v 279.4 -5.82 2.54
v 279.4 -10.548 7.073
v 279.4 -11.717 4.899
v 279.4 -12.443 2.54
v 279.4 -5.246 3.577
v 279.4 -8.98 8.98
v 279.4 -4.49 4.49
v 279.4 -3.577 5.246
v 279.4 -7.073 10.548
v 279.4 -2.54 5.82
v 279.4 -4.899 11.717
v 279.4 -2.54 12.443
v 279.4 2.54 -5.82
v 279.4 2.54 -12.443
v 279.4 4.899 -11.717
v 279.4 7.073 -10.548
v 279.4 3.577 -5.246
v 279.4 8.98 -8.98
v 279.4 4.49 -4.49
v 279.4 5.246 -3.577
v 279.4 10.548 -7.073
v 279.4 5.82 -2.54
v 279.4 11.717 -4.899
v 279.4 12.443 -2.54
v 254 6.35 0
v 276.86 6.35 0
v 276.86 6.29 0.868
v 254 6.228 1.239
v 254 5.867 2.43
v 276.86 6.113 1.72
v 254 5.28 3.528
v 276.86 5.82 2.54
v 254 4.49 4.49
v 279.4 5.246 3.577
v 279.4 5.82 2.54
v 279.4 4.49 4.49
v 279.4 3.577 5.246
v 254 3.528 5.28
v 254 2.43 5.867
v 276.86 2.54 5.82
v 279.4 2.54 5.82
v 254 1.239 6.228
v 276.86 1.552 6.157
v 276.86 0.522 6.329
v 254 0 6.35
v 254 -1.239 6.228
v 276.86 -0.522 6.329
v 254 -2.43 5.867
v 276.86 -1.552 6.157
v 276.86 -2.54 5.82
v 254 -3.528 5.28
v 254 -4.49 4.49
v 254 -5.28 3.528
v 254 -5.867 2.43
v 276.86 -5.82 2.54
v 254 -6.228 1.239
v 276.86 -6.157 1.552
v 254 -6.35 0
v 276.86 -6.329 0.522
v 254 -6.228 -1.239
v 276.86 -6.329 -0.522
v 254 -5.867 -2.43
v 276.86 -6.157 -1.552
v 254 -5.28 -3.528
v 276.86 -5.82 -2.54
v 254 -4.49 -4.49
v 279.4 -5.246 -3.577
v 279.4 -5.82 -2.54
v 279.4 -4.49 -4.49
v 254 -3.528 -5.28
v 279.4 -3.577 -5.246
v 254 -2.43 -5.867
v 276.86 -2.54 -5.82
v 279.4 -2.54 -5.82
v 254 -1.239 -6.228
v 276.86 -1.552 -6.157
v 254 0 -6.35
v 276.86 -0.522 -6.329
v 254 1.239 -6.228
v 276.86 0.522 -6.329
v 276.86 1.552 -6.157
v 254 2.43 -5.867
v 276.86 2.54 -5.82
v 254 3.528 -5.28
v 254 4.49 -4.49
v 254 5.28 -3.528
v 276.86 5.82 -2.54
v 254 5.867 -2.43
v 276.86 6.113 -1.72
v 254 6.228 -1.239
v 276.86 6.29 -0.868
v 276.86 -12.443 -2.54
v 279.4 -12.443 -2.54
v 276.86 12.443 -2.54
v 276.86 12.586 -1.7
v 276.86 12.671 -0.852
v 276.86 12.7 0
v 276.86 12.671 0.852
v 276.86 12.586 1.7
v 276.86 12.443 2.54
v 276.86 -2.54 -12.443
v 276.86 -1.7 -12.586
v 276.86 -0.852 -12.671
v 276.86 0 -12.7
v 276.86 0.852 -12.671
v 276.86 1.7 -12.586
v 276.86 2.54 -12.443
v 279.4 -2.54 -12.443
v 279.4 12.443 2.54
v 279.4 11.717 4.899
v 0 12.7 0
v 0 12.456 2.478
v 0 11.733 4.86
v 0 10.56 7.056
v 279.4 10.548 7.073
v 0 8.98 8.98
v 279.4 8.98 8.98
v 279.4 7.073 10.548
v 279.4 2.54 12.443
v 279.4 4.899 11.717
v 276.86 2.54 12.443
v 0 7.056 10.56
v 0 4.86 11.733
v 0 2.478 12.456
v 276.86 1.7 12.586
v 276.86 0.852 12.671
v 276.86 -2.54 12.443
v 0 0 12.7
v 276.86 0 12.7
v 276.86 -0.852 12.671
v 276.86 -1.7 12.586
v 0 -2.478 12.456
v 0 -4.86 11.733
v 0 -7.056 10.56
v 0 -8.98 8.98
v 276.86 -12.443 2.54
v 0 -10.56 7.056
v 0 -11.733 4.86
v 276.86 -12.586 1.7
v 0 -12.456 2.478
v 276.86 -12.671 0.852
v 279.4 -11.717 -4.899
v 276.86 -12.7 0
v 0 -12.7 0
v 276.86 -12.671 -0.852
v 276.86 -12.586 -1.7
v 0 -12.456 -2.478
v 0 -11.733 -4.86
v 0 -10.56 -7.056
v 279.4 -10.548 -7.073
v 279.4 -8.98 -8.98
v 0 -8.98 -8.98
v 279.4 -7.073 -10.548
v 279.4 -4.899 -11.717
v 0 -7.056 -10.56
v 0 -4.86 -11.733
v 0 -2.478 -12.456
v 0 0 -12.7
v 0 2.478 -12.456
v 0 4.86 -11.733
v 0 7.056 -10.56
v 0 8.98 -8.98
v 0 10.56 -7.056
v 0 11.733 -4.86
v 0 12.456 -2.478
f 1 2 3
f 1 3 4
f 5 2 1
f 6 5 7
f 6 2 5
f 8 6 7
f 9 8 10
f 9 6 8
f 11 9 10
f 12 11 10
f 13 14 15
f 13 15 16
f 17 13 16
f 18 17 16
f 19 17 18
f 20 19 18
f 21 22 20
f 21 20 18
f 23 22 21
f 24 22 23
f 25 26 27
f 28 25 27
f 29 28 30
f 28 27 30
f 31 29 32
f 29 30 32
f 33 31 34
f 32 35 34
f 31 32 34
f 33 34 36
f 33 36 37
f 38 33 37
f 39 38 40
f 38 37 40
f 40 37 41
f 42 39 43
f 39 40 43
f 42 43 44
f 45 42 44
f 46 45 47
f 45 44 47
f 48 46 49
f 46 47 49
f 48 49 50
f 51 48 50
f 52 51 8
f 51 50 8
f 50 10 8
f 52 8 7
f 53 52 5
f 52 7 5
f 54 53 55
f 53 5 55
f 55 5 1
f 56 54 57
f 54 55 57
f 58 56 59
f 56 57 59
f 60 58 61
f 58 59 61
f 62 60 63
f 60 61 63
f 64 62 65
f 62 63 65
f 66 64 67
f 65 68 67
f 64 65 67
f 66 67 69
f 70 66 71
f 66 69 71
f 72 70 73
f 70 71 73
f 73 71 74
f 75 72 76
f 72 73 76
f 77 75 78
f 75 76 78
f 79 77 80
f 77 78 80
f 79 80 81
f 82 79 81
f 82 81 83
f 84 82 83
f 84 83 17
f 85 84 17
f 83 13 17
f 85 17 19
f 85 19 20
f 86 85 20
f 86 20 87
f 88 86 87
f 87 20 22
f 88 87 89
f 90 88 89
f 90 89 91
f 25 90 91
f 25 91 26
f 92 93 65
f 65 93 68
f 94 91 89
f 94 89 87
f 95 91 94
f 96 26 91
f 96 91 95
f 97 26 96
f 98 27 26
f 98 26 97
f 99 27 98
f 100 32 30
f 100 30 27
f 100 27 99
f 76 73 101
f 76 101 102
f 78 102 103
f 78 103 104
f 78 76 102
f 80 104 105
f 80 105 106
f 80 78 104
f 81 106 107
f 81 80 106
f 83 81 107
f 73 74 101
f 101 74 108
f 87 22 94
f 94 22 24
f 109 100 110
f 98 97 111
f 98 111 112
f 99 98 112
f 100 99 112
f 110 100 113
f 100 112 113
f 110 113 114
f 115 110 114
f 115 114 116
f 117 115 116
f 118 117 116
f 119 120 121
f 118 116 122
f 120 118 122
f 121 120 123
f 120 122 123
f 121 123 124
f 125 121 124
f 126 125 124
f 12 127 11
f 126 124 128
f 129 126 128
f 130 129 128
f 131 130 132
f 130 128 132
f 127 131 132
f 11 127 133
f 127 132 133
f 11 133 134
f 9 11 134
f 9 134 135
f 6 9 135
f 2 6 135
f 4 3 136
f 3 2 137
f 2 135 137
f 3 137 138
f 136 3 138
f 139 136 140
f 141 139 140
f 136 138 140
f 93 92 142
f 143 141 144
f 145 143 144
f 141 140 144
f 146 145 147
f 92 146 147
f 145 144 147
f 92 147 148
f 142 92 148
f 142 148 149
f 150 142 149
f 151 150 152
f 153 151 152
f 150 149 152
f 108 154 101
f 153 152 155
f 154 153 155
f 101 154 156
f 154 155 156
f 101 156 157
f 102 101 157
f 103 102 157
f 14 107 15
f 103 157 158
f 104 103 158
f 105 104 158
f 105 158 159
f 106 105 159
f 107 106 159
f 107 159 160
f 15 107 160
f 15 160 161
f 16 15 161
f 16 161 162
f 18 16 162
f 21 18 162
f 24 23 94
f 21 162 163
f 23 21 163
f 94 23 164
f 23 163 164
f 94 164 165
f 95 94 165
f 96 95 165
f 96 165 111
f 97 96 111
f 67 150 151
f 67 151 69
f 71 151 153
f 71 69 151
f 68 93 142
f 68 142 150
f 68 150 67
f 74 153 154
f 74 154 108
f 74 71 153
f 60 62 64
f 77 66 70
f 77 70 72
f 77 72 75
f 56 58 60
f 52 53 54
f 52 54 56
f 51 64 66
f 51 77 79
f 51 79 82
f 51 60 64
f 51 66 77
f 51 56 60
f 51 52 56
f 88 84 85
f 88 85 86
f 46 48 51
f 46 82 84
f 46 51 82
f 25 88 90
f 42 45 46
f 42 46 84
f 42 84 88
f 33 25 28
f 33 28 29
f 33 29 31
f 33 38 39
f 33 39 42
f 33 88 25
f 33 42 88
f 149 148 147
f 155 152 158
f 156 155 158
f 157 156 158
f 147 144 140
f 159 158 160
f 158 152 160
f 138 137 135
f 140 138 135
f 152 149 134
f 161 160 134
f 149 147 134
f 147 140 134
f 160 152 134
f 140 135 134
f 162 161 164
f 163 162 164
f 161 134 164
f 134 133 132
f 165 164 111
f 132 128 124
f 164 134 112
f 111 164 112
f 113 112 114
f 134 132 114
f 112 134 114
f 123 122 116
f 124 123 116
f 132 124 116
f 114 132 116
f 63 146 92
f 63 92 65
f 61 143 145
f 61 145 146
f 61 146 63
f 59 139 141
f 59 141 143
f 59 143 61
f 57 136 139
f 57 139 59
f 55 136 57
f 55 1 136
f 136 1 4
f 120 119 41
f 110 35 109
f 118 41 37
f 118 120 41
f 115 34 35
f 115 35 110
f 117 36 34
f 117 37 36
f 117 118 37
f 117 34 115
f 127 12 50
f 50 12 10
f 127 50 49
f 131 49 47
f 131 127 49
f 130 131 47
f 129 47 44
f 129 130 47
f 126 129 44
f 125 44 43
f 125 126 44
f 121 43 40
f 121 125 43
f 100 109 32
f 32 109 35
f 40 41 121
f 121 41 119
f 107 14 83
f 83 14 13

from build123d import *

# Parameters (mm, degrees)
F0_R     = 12.7
F1_DEPTH = 279.4
F2_R     = 6.35
F3_DEPTH = 25.4
F5_DEPTH = 2.54


with BuildPart() as f1:
    # F0 (on Right) → F1 (new body)
    with BuildSketch(Plane.YZ):
        Circle(F0_R)
    extrude(amount=F1_DEPTH)

    # F2 (on face) → F3 (cut)
    with BuildSketch(Plane.YZ.offset(279.4)):
        Circle(F2_R)
    extrude(amount=-F3_DEPTH, mode=Mode.SUBTRACT)

    # F4 (on face) → F5 (cut)
    with BuildSketch(Plane.YZ.offset(279.4)):
        with BuildLine():
            Line((-5.8198711326, 2.54), (-12.4434078933, 2.54))
            ThreePointArc((-12.4434078933, 2.54), (-12.6356891432, 1.2764638175), (-12.7, 0))
            ThreePointArc((-12.7, 0), (-12.6356891432, -1.2764638175), (-12.4434078933, -2.54))
            Line((-12.4434078933, -2.54), (-5.8198711326, -2.54))
            ThreePointArc((-5.8198711326, -2.54), (-6.35, 0), (-5.8198711326, 2.54))
        make_face()
        with BuildLine():
            Line((12.4434078933, 2.54), (5.8198711326, 2.54))
            ThreePointArc((5.8198711326, 2.54), (6.2160550871, 1.2973662374), (6.35, 0))
            ThreePointArc((6.35, 0), (6.2160550871, -1.2973662374), (5.8198711326, -2.54))
            Line((5.8198711326, -2.54), (12.4434078933, -2.54))
            ThreePointArc((12.4434078933, -2.54), (12.6356891432, -1.2764638175), (12.7, 0))
            ThreePointArc((12.7, 0), (12.6356891432, 1.2764638175), (12.4434078933, 2.54))
        make_face()
        with BuildLine():
            ThreePointArc((0, 12.7), (-1.2764638175, 12.6356891432), (-2.54, 12.4434078933))
            Line((-2.54, 12.4434078933), (-2.54, 5.8198711326))
            ThreePointArc((-2.54, 5.8198711326), (0, 6.35), (2.54, 5.8198711326))
            Line((2.54, 5.8198711326), (2.54, 12.4434078933))
            ThreePointArc((2.54, 12.4434078933), (1.2764638175, 12.6356891432), (0, 12.7))
        make_face()
        with BuildLine():
            Line((-2.54, -5.8198711326), (-2.54, -12.4434078933))
            ThreePointArc((-2.54, -12.4434078933), (-1.2764638175, -12.6356891432), (0, -12.7))
            ThreePointArc((0, -12.7), (1.2764638175, -12.6356891432), (2.54, -12.4434078933))
            Line((2.54, -12.4434078933), (2.54, -5.8198711326))
            ThreePointArc((2.54, -5.8198711326), (0, -6.35), (-2.54, -5.8198711326))
        make_face()
    extrude(amount=-F5_DEPTH, mode=Mode.SUBTRACT)


solid = f1.part
